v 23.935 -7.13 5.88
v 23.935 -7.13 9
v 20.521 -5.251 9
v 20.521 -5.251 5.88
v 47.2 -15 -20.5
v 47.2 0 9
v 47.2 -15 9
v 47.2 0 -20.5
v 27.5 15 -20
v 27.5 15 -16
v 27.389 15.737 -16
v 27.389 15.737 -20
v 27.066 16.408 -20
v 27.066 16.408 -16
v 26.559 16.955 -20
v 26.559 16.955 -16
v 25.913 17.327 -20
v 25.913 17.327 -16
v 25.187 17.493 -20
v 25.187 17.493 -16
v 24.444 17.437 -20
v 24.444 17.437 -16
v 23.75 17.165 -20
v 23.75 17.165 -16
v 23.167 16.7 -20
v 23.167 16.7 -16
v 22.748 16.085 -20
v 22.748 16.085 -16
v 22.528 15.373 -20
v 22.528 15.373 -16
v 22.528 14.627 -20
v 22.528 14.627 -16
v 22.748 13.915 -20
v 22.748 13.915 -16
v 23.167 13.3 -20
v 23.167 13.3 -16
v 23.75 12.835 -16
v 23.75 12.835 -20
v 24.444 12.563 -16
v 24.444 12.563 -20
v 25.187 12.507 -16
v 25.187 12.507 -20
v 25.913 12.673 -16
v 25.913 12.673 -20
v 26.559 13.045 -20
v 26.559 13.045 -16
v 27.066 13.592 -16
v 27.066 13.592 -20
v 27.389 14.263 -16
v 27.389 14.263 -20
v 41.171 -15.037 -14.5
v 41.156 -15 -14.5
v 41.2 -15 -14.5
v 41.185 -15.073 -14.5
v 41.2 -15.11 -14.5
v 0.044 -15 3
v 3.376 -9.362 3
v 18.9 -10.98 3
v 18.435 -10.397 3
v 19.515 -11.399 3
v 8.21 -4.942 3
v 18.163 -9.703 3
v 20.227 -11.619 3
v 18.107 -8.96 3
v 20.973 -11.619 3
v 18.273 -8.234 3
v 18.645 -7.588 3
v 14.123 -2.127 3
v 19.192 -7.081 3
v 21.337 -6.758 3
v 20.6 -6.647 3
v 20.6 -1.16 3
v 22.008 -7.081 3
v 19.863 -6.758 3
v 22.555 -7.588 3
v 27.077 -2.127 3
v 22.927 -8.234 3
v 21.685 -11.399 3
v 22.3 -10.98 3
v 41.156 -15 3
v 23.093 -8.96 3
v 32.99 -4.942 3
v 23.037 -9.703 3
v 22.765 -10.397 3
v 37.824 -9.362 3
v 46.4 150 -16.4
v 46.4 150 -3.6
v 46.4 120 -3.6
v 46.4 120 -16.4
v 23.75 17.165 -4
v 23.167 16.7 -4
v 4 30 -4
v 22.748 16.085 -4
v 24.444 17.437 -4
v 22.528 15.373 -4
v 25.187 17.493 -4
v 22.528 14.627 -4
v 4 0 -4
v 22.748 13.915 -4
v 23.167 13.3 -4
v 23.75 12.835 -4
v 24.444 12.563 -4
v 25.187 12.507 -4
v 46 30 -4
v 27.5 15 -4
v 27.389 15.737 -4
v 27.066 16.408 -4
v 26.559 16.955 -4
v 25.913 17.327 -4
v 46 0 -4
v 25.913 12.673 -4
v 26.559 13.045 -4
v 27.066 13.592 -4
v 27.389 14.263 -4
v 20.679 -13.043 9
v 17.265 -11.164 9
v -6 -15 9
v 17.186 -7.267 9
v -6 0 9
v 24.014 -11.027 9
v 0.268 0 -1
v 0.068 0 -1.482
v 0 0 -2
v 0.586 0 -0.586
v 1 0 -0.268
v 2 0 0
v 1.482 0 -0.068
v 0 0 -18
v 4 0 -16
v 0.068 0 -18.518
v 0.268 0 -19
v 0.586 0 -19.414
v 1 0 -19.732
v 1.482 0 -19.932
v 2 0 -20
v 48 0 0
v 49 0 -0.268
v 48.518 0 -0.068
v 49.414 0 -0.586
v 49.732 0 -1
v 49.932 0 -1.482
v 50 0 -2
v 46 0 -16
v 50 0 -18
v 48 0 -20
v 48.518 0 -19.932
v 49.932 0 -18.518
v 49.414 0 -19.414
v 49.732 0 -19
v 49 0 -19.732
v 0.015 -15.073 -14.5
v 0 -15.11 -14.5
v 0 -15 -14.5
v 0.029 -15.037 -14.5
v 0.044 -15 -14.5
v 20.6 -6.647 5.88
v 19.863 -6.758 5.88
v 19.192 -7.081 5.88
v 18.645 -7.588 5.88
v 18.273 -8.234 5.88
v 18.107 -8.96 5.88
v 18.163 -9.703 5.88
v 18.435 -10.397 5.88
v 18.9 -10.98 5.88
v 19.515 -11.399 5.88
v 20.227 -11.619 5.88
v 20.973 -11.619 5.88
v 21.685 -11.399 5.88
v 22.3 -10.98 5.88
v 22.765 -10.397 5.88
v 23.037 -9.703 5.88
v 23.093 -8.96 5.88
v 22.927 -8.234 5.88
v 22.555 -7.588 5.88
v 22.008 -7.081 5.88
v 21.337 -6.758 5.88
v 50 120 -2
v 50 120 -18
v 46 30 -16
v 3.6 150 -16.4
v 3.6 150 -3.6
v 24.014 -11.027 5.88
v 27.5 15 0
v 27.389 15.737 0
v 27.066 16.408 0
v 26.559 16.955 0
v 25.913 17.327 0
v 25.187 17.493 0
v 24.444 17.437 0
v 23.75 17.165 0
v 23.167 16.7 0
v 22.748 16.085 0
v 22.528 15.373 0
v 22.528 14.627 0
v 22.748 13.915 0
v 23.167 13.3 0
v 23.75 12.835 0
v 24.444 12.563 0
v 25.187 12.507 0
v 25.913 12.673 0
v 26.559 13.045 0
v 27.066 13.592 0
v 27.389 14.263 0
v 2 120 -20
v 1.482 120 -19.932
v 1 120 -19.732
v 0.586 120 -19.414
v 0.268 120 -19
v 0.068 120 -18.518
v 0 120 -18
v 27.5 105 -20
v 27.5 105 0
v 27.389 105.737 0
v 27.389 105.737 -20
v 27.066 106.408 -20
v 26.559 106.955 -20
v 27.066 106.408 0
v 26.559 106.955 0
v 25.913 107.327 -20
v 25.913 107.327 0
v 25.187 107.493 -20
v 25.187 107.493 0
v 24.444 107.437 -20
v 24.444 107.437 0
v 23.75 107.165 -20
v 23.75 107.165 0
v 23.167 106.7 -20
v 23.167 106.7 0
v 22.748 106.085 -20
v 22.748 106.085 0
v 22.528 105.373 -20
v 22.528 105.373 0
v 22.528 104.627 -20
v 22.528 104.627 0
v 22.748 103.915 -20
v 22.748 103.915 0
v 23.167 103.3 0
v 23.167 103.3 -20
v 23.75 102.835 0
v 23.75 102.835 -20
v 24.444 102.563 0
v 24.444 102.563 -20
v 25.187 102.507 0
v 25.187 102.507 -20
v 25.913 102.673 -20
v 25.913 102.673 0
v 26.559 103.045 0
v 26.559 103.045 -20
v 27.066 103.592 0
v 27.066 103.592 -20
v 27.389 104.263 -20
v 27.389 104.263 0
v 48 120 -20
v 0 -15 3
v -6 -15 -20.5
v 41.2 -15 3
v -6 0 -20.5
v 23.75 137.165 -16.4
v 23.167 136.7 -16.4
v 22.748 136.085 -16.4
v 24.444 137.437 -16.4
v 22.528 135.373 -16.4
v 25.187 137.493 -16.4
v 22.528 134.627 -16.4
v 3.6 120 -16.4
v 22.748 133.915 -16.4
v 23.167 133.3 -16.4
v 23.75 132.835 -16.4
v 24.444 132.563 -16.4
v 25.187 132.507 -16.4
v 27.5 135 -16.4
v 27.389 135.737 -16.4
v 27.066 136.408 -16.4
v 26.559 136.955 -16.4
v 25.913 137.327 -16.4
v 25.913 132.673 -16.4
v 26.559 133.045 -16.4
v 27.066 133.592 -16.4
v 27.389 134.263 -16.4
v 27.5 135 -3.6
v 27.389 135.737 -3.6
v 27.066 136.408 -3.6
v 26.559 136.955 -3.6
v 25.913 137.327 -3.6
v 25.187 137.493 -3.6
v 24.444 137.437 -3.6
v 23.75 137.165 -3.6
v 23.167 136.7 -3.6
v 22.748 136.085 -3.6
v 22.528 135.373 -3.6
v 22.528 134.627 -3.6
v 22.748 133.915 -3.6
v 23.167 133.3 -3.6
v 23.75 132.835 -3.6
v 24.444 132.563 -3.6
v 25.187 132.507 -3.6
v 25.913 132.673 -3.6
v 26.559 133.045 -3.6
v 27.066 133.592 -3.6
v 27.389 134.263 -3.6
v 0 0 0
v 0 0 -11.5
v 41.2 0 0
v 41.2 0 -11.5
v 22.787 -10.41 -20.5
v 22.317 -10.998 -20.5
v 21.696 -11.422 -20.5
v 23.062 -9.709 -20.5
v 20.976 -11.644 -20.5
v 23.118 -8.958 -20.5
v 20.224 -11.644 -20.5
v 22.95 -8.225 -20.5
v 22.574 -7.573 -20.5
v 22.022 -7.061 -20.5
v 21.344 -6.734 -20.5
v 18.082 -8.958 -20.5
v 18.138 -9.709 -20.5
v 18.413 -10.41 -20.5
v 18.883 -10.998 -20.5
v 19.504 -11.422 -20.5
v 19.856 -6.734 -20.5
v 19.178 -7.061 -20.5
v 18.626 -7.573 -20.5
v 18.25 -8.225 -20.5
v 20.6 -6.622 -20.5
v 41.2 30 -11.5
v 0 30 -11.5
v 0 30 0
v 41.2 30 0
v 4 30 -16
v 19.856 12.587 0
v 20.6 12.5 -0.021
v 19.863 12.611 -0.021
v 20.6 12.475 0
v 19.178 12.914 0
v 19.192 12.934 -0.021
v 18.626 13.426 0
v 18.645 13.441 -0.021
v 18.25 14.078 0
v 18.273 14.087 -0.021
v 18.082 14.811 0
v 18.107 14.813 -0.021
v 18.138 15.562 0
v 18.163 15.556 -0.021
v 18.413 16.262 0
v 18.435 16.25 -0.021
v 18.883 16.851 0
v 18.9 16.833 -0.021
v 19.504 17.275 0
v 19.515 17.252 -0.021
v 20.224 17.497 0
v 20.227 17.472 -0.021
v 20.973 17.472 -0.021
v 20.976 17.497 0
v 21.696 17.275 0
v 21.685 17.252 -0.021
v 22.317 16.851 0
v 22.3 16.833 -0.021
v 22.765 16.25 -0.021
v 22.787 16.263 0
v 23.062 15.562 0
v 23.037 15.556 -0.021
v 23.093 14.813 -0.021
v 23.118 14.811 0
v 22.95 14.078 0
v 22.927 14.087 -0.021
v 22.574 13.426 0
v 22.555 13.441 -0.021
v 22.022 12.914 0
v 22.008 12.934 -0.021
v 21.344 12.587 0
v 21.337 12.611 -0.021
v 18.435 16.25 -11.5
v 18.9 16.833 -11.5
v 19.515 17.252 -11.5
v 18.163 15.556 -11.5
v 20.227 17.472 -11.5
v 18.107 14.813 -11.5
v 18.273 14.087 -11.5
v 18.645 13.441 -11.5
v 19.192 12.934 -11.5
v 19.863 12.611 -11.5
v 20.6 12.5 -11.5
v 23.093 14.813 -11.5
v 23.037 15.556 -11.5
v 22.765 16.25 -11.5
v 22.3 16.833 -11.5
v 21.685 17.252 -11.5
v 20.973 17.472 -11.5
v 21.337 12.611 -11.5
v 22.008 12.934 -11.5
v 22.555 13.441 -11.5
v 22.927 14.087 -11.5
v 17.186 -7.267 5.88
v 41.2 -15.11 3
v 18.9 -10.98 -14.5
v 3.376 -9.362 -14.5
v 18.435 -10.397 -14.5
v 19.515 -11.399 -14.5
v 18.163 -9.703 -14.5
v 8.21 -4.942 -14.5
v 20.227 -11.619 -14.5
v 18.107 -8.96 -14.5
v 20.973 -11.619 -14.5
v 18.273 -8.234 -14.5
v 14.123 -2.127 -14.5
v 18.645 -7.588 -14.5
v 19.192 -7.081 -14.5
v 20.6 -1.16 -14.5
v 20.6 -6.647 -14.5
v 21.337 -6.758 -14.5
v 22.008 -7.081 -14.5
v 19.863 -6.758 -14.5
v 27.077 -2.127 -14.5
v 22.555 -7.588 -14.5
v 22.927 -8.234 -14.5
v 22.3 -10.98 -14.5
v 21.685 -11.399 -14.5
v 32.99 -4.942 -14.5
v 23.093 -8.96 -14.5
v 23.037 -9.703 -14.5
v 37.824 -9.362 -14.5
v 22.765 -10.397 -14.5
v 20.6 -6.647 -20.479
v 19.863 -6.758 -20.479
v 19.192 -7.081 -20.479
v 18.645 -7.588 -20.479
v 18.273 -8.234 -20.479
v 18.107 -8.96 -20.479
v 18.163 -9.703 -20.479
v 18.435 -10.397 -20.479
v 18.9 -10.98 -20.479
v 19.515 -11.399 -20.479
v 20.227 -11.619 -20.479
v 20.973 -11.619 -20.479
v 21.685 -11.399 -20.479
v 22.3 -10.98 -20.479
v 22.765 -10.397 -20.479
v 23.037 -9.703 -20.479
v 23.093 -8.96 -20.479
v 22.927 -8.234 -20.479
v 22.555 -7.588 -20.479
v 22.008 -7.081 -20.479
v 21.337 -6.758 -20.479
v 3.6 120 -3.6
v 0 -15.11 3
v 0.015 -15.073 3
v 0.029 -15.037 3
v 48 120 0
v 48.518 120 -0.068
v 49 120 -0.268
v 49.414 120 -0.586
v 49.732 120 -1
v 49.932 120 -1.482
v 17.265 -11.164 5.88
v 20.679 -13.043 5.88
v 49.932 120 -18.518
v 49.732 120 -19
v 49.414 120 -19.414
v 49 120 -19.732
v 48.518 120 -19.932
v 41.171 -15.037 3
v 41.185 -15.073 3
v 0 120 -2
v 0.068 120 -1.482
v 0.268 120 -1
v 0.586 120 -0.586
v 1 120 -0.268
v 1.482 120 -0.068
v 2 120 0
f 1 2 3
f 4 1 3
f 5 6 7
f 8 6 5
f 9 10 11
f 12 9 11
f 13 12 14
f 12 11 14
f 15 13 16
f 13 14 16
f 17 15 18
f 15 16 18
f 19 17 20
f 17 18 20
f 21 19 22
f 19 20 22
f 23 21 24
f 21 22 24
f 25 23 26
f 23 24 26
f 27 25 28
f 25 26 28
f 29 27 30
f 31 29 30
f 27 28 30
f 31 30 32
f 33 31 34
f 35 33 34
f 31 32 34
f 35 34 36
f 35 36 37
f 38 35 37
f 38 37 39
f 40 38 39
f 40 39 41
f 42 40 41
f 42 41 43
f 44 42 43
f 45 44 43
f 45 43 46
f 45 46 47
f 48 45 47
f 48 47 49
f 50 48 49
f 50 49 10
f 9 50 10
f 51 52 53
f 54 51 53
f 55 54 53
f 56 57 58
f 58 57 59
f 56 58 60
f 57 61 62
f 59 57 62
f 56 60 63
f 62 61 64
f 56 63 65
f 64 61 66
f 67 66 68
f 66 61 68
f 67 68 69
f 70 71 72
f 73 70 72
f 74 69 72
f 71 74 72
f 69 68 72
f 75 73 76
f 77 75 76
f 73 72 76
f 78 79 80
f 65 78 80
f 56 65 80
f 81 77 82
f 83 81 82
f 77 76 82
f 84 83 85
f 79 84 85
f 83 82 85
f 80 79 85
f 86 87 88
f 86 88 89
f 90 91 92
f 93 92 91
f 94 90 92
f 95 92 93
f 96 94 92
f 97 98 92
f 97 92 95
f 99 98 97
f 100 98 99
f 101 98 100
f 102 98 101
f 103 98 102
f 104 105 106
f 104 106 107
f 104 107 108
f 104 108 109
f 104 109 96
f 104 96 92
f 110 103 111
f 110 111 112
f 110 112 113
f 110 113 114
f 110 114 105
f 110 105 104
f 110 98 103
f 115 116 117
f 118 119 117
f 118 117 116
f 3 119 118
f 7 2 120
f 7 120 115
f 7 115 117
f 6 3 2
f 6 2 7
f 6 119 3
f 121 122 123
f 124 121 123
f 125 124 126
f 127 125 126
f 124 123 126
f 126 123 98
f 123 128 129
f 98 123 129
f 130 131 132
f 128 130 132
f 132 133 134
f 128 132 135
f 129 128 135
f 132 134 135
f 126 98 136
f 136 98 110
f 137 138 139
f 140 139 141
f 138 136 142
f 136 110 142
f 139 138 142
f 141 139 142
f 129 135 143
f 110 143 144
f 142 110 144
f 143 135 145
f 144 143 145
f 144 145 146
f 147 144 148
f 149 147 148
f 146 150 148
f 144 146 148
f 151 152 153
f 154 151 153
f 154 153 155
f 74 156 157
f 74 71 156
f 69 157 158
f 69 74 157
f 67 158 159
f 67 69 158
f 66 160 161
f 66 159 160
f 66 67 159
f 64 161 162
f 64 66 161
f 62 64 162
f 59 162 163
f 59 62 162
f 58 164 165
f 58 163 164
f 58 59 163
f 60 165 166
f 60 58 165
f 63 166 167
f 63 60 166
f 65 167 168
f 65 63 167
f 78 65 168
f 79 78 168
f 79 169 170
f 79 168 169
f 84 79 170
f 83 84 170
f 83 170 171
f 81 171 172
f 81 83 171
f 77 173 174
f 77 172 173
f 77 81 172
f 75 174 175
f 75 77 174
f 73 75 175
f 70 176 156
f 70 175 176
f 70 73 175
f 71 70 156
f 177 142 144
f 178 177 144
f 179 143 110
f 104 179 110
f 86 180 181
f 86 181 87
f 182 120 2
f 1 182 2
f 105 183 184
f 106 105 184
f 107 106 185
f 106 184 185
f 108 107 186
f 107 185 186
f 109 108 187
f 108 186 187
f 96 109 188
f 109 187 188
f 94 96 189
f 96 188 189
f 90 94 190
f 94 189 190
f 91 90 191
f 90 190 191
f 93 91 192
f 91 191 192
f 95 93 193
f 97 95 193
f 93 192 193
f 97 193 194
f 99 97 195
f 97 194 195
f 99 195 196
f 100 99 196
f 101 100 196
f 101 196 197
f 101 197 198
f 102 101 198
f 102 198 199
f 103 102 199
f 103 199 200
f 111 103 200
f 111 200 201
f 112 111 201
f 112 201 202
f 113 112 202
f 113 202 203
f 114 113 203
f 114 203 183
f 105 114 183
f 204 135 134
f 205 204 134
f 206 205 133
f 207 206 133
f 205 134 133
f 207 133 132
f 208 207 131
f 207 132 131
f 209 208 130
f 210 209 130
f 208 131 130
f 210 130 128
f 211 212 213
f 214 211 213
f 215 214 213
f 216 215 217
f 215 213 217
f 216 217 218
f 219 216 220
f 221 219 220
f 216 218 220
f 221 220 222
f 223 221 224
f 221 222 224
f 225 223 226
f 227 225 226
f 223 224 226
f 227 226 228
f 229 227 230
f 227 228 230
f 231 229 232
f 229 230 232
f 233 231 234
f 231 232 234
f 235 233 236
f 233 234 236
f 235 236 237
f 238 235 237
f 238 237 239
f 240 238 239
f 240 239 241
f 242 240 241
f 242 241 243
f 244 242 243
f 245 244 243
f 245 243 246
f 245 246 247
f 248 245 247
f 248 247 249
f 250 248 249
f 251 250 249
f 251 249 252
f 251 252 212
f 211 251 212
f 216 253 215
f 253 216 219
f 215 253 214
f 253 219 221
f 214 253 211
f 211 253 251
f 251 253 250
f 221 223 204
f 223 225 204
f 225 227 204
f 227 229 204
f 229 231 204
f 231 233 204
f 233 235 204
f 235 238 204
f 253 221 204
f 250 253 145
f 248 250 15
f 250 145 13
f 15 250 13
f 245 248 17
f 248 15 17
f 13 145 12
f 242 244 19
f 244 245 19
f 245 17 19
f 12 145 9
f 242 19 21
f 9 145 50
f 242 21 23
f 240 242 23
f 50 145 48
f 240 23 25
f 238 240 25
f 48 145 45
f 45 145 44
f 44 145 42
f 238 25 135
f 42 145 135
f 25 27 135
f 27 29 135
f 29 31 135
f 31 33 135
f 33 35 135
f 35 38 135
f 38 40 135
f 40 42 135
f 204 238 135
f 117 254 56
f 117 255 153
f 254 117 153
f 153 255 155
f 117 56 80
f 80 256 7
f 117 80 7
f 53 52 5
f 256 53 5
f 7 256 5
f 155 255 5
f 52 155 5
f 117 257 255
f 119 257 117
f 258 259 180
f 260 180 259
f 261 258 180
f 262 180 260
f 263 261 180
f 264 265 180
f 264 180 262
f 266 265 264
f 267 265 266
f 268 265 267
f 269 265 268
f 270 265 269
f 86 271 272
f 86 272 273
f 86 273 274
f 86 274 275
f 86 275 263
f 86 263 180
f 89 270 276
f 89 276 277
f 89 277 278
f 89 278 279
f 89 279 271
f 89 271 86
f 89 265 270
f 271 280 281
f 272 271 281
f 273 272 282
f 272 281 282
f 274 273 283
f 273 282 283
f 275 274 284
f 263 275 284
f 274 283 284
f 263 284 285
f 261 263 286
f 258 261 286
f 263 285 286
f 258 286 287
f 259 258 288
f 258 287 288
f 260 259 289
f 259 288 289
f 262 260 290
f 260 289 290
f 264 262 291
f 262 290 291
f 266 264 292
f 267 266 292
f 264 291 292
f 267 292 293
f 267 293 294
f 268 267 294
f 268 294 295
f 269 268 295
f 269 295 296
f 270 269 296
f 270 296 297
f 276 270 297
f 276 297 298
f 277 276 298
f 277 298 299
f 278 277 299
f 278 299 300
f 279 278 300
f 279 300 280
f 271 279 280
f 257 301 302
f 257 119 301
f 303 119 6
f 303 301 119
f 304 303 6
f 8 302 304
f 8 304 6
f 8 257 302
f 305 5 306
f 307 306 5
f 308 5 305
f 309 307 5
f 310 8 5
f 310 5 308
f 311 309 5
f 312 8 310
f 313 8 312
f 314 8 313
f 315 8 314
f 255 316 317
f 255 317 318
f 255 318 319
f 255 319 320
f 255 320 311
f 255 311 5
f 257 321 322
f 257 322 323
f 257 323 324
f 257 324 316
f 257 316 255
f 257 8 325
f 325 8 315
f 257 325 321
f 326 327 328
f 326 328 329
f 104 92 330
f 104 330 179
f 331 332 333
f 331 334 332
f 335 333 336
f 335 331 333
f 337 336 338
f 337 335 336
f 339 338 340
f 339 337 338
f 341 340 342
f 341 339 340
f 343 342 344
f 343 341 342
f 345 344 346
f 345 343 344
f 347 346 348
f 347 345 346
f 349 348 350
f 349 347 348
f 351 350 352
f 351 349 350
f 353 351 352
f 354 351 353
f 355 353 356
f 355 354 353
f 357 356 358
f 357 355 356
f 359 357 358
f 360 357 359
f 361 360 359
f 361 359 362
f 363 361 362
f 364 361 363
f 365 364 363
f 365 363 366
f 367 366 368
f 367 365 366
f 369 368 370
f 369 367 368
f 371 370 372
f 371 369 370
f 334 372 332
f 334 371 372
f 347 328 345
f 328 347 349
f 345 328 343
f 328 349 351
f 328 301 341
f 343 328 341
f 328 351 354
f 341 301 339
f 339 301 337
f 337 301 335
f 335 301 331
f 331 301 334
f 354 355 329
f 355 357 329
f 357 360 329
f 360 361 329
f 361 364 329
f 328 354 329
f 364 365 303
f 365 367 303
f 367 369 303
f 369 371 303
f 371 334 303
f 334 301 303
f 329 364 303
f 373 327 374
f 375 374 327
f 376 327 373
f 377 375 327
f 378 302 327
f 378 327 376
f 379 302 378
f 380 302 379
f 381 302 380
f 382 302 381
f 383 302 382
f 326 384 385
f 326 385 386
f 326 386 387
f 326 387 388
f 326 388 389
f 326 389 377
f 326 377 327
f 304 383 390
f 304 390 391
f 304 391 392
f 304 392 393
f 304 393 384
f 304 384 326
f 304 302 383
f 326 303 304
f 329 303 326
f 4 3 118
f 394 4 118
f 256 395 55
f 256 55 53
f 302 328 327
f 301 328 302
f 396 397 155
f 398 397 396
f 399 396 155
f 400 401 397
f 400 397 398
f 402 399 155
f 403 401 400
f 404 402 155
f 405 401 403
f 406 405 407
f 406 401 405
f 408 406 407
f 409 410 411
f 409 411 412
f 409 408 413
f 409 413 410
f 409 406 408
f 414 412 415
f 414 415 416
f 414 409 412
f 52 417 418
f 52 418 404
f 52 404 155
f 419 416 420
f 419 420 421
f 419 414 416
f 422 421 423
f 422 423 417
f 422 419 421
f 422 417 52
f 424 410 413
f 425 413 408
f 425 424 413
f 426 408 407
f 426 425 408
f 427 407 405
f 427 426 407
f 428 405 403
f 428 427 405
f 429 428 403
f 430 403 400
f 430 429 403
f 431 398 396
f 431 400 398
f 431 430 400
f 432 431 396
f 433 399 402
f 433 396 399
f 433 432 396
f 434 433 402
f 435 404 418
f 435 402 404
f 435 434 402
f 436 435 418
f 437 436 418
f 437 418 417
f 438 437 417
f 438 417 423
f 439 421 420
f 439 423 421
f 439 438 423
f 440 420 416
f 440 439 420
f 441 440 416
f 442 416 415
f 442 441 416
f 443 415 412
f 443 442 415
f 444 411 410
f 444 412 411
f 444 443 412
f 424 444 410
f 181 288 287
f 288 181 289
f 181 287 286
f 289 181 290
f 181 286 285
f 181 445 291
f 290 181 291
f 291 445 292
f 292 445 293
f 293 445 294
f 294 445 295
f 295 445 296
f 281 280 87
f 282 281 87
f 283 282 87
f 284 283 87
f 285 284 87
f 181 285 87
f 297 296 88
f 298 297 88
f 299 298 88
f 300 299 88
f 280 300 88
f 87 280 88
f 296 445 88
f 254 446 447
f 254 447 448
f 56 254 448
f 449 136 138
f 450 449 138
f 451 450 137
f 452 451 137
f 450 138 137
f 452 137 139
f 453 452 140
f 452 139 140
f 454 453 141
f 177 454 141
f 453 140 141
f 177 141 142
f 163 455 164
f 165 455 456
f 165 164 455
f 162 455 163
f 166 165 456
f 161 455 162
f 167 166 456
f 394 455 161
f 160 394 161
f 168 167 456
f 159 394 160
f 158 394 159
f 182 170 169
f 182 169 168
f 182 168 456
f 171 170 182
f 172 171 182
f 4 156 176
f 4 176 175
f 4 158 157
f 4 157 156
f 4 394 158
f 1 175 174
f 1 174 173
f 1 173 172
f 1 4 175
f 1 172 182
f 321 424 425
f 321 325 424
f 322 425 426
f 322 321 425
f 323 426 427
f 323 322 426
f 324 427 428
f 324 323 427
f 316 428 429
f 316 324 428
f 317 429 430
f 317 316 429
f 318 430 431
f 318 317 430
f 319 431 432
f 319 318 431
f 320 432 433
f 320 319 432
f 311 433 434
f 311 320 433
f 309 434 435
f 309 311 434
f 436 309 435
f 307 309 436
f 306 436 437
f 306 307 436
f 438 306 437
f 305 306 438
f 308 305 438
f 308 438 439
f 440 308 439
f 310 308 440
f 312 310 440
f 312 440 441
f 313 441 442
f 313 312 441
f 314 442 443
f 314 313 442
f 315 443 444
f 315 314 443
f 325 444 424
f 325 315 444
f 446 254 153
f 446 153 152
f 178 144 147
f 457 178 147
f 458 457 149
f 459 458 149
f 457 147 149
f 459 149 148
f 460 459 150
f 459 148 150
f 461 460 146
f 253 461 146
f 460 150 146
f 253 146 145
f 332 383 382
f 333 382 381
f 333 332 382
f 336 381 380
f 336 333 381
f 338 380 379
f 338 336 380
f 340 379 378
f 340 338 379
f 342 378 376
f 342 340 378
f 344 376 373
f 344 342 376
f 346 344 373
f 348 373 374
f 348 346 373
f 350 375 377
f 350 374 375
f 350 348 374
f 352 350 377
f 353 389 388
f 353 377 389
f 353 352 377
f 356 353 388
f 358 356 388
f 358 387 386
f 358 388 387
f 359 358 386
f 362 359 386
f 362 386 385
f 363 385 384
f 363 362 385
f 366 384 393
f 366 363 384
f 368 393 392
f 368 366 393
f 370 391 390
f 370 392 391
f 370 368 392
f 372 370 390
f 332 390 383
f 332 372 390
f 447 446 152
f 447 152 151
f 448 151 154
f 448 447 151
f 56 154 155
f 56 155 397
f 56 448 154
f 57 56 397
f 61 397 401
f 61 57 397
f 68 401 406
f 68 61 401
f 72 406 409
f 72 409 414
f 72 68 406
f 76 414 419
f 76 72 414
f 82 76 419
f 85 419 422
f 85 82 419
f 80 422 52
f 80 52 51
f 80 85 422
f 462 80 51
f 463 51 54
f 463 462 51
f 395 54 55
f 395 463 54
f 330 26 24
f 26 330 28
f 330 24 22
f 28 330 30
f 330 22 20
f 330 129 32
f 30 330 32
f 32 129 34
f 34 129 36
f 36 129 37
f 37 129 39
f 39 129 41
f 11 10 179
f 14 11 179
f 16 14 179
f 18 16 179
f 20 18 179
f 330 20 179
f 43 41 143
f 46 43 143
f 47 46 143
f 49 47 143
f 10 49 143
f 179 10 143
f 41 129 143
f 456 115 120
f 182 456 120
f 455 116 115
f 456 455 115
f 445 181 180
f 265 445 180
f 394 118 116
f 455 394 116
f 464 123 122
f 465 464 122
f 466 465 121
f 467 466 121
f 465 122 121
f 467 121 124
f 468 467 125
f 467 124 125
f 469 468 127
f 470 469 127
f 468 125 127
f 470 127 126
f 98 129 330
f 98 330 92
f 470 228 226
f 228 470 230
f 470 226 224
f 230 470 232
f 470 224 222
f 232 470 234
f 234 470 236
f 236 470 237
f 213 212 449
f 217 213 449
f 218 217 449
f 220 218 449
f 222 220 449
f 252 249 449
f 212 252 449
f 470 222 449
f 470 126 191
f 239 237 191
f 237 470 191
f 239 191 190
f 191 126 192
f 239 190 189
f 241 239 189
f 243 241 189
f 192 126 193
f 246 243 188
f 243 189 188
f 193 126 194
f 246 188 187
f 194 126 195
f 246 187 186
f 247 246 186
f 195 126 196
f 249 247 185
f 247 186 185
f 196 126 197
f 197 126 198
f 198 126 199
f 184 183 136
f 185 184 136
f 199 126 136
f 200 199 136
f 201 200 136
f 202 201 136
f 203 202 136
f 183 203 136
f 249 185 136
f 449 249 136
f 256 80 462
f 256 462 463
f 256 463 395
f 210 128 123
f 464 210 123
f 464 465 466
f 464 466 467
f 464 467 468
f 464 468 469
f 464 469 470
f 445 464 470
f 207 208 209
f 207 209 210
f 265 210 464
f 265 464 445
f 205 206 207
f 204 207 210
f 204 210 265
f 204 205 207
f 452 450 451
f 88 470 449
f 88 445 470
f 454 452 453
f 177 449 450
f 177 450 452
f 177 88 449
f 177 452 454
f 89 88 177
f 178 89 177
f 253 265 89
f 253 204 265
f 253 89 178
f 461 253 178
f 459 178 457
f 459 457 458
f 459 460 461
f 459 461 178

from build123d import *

# Parameters (mm, degrees)
BOSS_EXTRUDE1_DEPTH      = 120
SKETCH3_W                = 42
SKETCH3_H                = 12
CUT_EXTRUDE2_DEPTH       = 30
SKETCH6_R                = 2.5
CUT_EXTRUDE3_DEPTH       = 30
SKETCH8_W                = 42.8
SKETCH8_H                = 12.8
BOSS_EXTRUDE2_DEPTH      = 30
SKETCH9_R                = 2.5
CUT_EXTRUDE4_DEPTH       = 30
SKETCH11_W               = 41.2
SKETCH11_H               = 11.5
BOSS_EXTRUDE3_DEPTH      = 30
BOSS_EXTRUDE4_DEPTH      = 3
BOSS_EXTRUDE4_DEPTH_BACK = 14.5
SKETCH16_W               = 41.2
SKETCH16_H               = 17.5
BOSS_EXTRUDE5_DEPTH      = 15
CUT_EXTRUDE5_DEPTH       = 3.12


with BuildPart() as part:
    # Sketch1 → Boss-Extrude1 (new body)
    with BuildSketch(Plane(origin=(0, 0, 0), x_dir=(1, 0, 0), z_dir=(0, 1, 0))):
        with BuildLine():
            Line((2, 0), (48, 0))
            ThreePointArc((48, 0), (49.414213562, 0.585786438), (50, 2))
            Line((50, 2), (50, 18))
            ThreePointArc((50, 18), (49.414213562, 19.414213562), (48, 20))
            Line((48, 20), (2, 20))
            ThreePointArc((2, 20), (0.585786438, 19.414213562), (0, 18))
            Line((0, 18), (0, 2))
            ThreePointArc((0, 2), (0.585786438, 0.585786438), (2, 0))
        make_face()
    extrude(amount=BOSS_EXTRUDE1_DEPTH)

    # Sketch3 → Cut-Extrude2 (cut)
    with BuildSketch(Plane.XZ):
        with Locations((25, -10)):
            Rectangle(SKETCH3_W, SKETCH3_H)
    extrude(amount=-CUT_EXTRUDE2_DEPTH, mode=Mode.SUBTRACT)

    # Sketch6 → Cut-Extrude3 (cut)
    with BuildSketch(Plane.XY):
        with Locations((25, 105)):
            Circle(SKETCH6_R)
        with Locations((25, 15)):
            Circle(SKETCH6_R)
    extrude(amount=-CUT_EXTRUDE3_DEPTH, mode=Mode.SUBTRACT)

    # Sketch8 → Boss-Extrude2 (add)
    with BuildSketch(Plane(origin=(0, 120, 0), x_dir=(1, 0, 0), z_dir=(0, 1, 0))):
        with Locations((25, 10)):
            Rectangle(SKETCH8_W, SKETCH8_H)
    extrude(amount=BOSS_EXTRUDE2_DEPTH)

    # Sketch9 → Cut-Extrude4 (cut)
    with BuildSketch(Plane.XY.offset(-3.6)):
        with Locations((25, 135)):
            Circle(SKETCH9_R)
    extrude(amount=-CUT_EXTRUDE4_DEPTH, mode=Mode.SUBTRACT)


with BuildPart() as body_2:
    # Sketch11 → Boss-Extrude3 (new body)
    with BuildSketch(Plane(origin=(0, 0, 0), x_dir=(1, 0, 0), z_dir=(0, 1, 0))):
        with Locations((20.6, 5.75)):
            Rectangle(SKETCH11_W, SKETCH11_H)
    extrude(amount=BOSS_EXTRUDE3_DEPTH)

    # Sketch13 → Ø5.0 (5) Diameter Hole1 (revolve, cut)
    with BuildSketch(Plane(origin=(20.6, 15, 0), x_dir=(0, -1, 0), z_dir=(1, 0, 0))):
        Polygon((0, 0), (0, 20), (2.5, 20), (2.5, 0.020977491), (2.525, 0), align=None)
    revolve(axis=Axis((20.6, 15, 6.35), (0, 0, -1)), mode=Mode.SUBTRACT)

    # Sketch15 → Boss-Extrude4 (add, two sides)
    with BuildSketch(Plane.XY) as boss_extrude4_sk:
        with BuildLine():
            Line((0, 0), (0, -15.109741722))
            ThreePointArc((0, -15.109741722), (20.6, -1.159826197), (41.2, -15.109741722))
            Line((41.2, -15.109741722), (41.2, 0))
            Line((41.2, 0), (0, 0))
        make_face()
    extrude(amount=BOSS_EXTRUDE4_DEPTH)
    extrude(boss_extrude4_sk.sketch, amount=-BOSS_EXTRUDE4_DEPTH_BACK)

    # Sketch16 → Boss-Extrude5 (add)
    with BuildSketch(Plane(origin=(0, 0, 0), x_dir=(1, 0, 0), z_dir=(0, 1, 0))):
        Polygon((-6, 20.5), (-6, 11.5), (-6, 0), (-6, -9), (47.2, -9), (47.2, 0), (47.2, 11.5), (47.2, 20.5), align=None)
        with Locations((20.6, 5.75)):
            Rectangle(SKETCH16_W, SKETCH16_H, mode=Mode.SUBTRACT)
    extrude(amount=-BOSS_EXTRUDE5_DEPTH)

    # Sketch18 → Ø5.0 (5) Diameter Hole2 (revolve, cut)
    with BuildSketch(Plane(origin=(20.6, -9.147025383, -20.5), x_dir=(0, 1, 0), z_dir=(1, 0, 0))):
        Polygon((0, 0), (0, 29.5), (2.5, 29.5), (2.5, 0.020977491), (2.525, 0), align=None)
    revolve(axis=Axis((20.6, -9.147025383, -26.85), (0, 0, 1)), mode=Mode.SUBTRACT)

    # Sketch22 → Cut-Extrude5 (cut)
    with BuildSketch(Plane.XY.offset(9)):
        Polygon((24.013806249, -11.026766561), (23.934806737, -7.130453037), (20.521000488, -5.250711859), (17.186193751, -7.267284205), (17.265193263, -11.163597729), (20.678999512, -13.043338907), align=None)
    extrude(amount=-CUT_EXTRUDE5_DEPTH, mode=Mode.SUBTRACT)


solid = Compound([part.part, body_2.part])
